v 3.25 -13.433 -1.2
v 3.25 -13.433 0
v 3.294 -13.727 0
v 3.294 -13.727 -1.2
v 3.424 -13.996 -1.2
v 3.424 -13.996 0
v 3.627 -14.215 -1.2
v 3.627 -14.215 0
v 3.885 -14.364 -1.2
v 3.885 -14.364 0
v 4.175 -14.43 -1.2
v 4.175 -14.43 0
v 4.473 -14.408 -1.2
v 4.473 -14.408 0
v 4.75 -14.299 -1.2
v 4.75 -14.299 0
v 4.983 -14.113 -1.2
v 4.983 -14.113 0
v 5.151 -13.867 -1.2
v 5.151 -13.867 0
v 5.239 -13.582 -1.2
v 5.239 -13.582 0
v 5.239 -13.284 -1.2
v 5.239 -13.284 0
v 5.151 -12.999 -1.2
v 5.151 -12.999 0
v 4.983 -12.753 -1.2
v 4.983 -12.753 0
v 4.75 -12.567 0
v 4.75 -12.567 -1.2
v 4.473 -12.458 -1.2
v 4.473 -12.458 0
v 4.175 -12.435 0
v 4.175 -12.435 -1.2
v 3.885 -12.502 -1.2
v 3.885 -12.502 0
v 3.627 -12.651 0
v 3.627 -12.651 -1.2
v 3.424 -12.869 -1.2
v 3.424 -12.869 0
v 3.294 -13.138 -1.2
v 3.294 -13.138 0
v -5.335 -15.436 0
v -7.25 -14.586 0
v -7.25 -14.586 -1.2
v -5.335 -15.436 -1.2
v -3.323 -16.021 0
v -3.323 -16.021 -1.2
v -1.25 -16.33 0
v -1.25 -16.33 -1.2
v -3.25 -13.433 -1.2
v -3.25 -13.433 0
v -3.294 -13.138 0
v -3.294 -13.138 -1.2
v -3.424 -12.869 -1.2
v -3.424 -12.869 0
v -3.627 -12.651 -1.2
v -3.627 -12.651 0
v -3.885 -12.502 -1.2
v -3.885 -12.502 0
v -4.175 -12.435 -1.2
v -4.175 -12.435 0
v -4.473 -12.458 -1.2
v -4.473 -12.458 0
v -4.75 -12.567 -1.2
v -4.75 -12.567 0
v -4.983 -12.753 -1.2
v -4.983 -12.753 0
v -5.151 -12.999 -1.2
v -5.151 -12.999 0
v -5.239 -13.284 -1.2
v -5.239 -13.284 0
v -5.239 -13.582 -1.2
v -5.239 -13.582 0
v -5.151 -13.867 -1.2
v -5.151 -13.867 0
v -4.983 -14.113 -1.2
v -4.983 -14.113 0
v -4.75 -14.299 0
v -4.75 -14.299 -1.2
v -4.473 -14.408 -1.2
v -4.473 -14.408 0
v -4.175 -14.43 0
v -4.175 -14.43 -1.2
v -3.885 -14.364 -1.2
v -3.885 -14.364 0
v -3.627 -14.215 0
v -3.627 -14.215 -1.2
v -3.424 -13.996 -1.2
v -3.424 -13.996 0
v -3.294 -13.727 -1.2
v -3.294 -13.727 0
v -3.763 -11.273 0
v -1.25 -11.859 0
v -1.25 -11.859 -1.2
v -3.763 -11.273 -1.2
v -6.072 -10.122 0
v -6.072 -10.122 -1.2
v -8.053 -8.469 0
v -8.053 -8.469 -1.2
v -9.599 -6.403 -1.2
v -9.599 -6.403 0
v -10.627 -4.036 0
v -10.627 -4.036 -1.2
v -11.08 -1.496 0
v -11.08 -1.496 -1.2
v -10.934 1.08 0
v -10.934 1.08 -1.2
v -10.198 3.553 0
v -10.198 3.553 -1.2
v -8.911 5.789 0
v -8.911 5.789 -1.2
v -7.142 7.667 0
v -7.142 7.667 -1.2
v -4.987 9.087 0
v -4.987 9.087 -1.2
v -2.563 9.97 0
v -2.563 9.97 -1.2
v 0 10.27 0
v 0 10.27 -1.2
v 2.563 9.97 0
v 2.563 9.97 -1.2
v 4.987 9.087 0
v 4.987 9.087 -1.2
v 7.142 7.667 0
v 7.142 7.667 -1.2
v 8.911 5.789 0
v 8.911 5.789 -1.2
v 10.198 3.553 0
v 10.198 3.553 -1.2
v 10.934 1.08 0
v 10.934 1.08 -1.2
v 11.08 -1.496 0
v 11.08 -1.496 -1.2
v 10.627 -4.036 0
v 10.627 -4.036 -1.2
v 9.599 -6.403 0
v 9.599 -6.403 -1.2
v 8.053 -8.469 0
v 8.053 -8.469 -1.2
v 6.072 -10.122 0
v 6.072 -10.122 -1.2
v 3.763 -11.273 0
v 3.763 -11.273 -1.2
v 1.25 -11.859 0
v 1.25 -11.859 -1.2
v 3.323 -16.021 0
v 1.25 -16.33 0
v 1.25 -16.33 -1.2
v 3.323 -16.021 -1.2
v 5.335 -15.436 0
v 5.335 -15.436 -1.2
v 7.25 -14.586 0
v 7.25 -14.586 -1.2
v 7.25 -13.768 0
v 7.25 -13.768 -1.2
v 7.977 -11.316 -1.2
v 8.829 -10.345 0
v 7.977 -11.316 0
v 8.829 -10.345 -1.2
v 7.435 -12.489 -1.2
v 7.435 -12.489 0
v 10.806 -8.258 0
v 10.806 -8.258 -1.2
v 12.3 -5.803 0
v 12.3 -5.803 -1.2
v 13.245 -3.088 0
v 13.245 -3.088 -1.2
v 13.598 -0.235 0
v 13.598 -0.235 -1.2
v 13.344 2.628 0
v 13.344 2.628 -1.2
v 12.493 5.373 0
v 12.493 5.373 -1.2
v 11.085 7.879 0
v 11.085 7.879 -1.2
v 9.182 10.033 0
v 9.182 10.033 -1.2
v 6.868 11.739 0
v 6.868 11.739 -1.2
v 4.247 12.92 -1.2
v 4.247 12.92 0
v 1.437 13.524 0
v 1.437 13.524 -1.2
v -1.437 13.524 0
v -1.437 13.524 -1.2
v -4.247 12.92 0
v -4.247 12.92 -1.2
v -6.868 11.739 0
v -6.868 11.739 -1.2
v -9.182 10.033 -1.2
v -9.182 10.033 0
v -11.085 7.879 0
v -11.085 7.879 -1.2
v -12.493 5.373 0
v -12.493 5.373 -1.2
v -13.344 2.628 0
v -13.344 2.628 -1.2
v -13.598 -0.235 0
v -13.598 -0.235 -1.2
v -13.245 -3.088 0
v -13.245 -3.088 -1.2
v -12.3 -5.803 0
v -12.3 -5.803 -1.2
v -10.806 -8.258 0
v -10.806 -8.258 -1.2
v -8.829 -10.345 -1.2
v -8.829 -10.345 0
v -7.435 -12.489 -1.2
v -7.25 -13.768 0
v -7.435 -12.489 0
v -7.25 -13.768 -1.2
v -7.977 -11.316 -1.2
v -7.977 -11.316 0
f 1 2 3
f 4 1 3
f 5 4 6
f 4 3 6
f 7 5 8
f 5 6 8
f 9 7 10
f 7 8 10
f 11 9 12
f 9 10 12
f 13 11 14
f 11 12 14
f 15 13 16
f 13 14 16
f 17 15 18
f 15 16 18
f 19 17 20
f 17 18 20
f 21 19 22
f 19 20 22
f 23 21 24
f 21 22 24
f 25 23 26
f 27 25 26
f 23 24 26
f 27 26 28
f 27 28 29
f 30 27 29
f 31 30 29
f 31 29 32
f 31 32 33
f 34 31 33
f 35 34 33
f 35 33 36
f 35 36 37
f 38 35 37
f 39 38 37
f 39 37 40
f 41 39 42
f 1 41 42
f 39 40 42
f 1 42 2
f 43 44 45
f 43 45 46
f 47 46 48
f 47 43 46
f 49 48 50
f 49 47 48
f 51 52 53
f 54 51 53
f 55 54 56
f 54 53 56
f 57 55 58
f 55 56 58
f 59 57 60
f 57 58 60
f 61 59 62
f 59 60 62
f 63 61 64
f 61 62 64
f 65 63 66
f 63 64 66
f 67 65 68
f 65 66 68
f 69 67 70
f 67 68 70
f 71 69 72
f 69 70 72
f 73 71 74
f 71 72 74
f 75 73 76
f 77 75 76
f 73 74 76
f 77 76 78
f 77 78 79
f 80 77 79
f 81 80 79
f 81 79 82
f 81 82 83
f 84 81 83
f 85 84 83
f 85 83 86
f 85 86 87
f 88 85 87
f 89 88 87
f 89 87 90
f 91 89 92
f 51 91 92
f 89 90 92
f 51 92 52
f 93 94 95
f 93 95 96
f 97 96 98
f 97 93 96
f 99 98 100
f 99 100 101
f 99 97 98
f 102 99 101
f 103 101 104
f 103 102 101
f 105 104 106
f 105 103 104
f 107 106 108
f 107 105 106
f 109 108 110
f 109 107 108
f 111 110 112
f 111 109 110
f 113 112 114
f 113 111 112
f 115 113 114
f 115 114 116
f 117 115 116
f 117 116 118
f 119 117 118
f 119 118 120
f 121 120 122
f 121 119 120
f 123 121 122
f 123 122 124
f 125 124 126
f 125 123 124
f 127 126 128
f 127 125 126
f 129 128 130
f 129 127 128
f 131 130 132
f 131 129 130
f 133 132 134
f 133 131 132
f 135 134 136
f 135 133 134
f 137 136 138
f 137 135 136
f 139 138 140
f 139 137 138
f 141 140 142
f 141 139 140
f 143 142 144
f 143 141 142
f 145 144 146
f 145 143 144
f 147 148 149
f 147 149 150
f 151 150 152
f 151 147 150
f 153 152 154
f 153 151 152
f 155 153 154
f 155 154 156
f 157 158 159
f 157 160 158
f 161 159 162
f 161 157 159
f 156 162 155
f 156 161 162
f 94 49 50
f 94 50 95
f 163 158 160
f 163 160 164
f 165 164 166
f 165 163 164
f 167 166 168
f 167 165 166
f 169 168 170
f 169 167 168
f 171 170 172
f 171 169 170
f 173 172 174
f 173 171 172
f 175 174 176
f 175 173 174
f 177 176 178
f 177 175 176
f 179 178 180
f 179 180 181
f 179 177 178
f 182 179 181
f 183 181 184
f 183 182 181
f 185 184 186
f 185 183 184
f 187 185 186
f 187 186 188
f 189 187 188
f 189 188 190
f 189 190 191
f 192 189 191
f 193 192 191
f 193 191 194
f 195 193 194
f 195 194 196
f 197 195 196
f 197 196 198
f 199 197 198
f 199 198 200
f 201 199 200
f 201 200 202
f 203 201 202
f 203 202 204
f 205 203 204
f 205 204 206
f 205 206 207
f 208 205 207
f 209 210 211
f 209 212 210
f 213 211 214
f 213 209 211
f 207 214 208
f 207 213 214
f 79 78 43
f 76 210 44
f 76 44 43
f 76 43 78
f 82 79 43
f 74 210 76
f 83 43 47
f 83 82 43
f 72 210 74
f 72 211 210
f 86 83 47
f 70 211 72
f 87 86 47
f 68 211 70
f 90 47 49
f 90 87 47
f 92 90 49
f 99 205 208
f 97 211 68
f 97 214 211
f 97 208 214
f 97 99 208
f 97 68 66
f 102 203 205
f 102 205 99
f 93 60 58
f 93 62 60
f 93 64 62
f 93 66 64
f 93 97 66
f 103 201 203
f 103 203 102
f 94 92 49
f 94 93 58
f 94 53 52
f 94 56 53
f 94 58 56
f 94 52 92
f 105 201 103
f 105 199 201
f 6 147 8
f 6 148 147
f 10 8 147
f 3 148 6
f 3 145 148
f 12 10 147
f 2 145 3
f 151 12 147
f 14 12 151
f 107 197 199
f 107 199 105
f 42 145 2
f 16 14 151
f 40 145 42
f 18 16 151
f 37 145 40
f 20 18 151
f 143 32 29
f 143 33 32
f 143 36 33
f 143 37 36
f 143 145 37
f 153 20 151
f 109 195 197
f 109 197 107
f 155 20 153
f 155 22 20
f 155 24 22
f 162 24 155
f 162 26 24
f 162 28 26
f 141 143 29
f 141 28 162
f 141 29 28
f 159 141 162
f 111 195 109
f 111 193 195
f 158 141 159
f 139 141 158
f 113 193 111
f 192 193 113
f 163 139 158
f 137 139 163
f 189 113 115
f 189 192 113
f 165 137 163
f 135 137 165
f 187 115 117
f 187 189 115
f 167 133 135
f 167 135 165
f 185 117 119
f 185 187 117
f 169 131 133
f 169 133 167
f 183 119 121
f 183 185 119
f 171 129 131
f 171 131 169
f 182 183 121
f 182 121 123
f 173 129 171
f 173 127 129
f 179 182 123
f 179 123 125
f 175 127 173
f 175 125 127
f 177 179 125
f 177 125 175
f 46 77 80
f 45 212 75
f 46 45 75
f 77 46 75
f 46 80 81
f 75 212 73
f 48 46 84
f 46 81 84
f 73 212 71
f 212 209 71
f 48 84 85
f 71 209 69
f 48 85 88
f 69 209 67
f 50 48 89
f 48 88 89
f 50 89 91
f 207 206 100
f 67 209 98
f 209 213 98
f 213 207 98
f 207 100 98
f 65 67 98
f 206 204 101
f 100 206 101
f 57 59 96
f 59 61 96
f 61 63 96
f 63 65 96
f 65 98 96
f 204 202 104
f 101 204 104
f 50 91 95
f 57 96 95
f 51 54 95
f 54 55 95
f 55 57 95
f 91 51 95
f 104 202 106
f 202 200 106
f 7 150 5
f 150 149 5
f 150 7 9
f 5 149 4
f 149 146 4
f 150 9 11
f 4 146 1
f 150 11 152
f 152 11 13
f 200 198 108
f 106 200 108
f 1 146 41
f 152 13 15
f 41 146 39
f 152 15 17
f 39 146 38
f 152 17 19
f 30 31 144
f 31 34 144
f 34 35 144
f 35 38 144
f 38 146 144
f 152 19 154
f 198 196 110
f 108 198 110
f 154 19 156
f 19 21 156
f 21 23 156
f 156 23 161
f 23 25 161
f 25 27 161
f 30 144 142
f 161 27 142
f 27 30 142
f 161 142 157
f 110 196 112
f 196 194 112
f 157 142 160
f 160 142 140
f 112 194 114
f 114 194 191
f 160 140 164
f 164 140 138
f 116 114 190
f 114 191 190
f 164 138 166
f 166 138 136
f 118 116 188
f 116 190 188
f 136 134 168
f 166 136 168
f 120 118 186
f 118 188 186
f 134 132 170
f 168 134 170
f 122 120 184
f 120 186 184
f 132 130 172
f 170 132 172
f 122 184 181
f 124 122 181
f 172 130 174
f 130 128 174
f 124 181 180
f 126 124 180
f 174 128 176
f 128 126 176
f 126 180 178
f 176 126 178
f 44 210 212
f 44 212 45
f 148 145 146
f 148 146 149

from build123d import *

# Parameters (mm, degrees)
SKETCH1_R  = 1
BODY_DEPTH = 1.2
FILLET1_R  = 4.5


with BuildPart() as part:
    # Sketch1 → Body (new body)
    with BuildSketch(Plane.XY):
        with BuildLine():
            Line((-1.25, -16.329677416), (-1.25, -11.859392549))
            ThreePointArc((-1.25, -11.859392549), (0, 10.27), (1.25, -11.859392549))
            Line((1.25, -11.859392549), (1.25, -16.329677416))
            ThreePointArc((1.25, -16.329677416), (4.338456847, -15.762524642), (7.25, -14.586453031))
            Line((7.25, -14.586453031), (7.25, -11.506411256))
            ThreePointArc((7.25, -11.506411256), (0, 13.6), (-7.25, -11.506411256))
            Line((-7.25, -11.506411256), (-7.25, -14.586453031))
            ThreePointArc((-7.25, -14.586453031), (-4.338456847, -15.762524642), (-1.25, -16.329677416))
        make_face()
        with Locations((-4.25, -13.432678287)):
            Circle(SKETCH1_R, mode=Mode.SUBTRACT)
        with Locations(Location((4.25, -13.432678287, 0), (0, 0, 180))):
            Circle(SKETCH1_R, mode=Mode.SUBTRACT)
    extrude(amount=-BODY_DEPTH)

    # Fillet1
    fillet1_edges = [part.edges().sort_by_distance(p)[0] for p in [
        (7.25, -11.506411256, -0.6),
        (-7.25, -11.506411256, -0.6),
    ]]
    fillet(fillet1_edges, radius=FILLET1_R)


solid = part.part
